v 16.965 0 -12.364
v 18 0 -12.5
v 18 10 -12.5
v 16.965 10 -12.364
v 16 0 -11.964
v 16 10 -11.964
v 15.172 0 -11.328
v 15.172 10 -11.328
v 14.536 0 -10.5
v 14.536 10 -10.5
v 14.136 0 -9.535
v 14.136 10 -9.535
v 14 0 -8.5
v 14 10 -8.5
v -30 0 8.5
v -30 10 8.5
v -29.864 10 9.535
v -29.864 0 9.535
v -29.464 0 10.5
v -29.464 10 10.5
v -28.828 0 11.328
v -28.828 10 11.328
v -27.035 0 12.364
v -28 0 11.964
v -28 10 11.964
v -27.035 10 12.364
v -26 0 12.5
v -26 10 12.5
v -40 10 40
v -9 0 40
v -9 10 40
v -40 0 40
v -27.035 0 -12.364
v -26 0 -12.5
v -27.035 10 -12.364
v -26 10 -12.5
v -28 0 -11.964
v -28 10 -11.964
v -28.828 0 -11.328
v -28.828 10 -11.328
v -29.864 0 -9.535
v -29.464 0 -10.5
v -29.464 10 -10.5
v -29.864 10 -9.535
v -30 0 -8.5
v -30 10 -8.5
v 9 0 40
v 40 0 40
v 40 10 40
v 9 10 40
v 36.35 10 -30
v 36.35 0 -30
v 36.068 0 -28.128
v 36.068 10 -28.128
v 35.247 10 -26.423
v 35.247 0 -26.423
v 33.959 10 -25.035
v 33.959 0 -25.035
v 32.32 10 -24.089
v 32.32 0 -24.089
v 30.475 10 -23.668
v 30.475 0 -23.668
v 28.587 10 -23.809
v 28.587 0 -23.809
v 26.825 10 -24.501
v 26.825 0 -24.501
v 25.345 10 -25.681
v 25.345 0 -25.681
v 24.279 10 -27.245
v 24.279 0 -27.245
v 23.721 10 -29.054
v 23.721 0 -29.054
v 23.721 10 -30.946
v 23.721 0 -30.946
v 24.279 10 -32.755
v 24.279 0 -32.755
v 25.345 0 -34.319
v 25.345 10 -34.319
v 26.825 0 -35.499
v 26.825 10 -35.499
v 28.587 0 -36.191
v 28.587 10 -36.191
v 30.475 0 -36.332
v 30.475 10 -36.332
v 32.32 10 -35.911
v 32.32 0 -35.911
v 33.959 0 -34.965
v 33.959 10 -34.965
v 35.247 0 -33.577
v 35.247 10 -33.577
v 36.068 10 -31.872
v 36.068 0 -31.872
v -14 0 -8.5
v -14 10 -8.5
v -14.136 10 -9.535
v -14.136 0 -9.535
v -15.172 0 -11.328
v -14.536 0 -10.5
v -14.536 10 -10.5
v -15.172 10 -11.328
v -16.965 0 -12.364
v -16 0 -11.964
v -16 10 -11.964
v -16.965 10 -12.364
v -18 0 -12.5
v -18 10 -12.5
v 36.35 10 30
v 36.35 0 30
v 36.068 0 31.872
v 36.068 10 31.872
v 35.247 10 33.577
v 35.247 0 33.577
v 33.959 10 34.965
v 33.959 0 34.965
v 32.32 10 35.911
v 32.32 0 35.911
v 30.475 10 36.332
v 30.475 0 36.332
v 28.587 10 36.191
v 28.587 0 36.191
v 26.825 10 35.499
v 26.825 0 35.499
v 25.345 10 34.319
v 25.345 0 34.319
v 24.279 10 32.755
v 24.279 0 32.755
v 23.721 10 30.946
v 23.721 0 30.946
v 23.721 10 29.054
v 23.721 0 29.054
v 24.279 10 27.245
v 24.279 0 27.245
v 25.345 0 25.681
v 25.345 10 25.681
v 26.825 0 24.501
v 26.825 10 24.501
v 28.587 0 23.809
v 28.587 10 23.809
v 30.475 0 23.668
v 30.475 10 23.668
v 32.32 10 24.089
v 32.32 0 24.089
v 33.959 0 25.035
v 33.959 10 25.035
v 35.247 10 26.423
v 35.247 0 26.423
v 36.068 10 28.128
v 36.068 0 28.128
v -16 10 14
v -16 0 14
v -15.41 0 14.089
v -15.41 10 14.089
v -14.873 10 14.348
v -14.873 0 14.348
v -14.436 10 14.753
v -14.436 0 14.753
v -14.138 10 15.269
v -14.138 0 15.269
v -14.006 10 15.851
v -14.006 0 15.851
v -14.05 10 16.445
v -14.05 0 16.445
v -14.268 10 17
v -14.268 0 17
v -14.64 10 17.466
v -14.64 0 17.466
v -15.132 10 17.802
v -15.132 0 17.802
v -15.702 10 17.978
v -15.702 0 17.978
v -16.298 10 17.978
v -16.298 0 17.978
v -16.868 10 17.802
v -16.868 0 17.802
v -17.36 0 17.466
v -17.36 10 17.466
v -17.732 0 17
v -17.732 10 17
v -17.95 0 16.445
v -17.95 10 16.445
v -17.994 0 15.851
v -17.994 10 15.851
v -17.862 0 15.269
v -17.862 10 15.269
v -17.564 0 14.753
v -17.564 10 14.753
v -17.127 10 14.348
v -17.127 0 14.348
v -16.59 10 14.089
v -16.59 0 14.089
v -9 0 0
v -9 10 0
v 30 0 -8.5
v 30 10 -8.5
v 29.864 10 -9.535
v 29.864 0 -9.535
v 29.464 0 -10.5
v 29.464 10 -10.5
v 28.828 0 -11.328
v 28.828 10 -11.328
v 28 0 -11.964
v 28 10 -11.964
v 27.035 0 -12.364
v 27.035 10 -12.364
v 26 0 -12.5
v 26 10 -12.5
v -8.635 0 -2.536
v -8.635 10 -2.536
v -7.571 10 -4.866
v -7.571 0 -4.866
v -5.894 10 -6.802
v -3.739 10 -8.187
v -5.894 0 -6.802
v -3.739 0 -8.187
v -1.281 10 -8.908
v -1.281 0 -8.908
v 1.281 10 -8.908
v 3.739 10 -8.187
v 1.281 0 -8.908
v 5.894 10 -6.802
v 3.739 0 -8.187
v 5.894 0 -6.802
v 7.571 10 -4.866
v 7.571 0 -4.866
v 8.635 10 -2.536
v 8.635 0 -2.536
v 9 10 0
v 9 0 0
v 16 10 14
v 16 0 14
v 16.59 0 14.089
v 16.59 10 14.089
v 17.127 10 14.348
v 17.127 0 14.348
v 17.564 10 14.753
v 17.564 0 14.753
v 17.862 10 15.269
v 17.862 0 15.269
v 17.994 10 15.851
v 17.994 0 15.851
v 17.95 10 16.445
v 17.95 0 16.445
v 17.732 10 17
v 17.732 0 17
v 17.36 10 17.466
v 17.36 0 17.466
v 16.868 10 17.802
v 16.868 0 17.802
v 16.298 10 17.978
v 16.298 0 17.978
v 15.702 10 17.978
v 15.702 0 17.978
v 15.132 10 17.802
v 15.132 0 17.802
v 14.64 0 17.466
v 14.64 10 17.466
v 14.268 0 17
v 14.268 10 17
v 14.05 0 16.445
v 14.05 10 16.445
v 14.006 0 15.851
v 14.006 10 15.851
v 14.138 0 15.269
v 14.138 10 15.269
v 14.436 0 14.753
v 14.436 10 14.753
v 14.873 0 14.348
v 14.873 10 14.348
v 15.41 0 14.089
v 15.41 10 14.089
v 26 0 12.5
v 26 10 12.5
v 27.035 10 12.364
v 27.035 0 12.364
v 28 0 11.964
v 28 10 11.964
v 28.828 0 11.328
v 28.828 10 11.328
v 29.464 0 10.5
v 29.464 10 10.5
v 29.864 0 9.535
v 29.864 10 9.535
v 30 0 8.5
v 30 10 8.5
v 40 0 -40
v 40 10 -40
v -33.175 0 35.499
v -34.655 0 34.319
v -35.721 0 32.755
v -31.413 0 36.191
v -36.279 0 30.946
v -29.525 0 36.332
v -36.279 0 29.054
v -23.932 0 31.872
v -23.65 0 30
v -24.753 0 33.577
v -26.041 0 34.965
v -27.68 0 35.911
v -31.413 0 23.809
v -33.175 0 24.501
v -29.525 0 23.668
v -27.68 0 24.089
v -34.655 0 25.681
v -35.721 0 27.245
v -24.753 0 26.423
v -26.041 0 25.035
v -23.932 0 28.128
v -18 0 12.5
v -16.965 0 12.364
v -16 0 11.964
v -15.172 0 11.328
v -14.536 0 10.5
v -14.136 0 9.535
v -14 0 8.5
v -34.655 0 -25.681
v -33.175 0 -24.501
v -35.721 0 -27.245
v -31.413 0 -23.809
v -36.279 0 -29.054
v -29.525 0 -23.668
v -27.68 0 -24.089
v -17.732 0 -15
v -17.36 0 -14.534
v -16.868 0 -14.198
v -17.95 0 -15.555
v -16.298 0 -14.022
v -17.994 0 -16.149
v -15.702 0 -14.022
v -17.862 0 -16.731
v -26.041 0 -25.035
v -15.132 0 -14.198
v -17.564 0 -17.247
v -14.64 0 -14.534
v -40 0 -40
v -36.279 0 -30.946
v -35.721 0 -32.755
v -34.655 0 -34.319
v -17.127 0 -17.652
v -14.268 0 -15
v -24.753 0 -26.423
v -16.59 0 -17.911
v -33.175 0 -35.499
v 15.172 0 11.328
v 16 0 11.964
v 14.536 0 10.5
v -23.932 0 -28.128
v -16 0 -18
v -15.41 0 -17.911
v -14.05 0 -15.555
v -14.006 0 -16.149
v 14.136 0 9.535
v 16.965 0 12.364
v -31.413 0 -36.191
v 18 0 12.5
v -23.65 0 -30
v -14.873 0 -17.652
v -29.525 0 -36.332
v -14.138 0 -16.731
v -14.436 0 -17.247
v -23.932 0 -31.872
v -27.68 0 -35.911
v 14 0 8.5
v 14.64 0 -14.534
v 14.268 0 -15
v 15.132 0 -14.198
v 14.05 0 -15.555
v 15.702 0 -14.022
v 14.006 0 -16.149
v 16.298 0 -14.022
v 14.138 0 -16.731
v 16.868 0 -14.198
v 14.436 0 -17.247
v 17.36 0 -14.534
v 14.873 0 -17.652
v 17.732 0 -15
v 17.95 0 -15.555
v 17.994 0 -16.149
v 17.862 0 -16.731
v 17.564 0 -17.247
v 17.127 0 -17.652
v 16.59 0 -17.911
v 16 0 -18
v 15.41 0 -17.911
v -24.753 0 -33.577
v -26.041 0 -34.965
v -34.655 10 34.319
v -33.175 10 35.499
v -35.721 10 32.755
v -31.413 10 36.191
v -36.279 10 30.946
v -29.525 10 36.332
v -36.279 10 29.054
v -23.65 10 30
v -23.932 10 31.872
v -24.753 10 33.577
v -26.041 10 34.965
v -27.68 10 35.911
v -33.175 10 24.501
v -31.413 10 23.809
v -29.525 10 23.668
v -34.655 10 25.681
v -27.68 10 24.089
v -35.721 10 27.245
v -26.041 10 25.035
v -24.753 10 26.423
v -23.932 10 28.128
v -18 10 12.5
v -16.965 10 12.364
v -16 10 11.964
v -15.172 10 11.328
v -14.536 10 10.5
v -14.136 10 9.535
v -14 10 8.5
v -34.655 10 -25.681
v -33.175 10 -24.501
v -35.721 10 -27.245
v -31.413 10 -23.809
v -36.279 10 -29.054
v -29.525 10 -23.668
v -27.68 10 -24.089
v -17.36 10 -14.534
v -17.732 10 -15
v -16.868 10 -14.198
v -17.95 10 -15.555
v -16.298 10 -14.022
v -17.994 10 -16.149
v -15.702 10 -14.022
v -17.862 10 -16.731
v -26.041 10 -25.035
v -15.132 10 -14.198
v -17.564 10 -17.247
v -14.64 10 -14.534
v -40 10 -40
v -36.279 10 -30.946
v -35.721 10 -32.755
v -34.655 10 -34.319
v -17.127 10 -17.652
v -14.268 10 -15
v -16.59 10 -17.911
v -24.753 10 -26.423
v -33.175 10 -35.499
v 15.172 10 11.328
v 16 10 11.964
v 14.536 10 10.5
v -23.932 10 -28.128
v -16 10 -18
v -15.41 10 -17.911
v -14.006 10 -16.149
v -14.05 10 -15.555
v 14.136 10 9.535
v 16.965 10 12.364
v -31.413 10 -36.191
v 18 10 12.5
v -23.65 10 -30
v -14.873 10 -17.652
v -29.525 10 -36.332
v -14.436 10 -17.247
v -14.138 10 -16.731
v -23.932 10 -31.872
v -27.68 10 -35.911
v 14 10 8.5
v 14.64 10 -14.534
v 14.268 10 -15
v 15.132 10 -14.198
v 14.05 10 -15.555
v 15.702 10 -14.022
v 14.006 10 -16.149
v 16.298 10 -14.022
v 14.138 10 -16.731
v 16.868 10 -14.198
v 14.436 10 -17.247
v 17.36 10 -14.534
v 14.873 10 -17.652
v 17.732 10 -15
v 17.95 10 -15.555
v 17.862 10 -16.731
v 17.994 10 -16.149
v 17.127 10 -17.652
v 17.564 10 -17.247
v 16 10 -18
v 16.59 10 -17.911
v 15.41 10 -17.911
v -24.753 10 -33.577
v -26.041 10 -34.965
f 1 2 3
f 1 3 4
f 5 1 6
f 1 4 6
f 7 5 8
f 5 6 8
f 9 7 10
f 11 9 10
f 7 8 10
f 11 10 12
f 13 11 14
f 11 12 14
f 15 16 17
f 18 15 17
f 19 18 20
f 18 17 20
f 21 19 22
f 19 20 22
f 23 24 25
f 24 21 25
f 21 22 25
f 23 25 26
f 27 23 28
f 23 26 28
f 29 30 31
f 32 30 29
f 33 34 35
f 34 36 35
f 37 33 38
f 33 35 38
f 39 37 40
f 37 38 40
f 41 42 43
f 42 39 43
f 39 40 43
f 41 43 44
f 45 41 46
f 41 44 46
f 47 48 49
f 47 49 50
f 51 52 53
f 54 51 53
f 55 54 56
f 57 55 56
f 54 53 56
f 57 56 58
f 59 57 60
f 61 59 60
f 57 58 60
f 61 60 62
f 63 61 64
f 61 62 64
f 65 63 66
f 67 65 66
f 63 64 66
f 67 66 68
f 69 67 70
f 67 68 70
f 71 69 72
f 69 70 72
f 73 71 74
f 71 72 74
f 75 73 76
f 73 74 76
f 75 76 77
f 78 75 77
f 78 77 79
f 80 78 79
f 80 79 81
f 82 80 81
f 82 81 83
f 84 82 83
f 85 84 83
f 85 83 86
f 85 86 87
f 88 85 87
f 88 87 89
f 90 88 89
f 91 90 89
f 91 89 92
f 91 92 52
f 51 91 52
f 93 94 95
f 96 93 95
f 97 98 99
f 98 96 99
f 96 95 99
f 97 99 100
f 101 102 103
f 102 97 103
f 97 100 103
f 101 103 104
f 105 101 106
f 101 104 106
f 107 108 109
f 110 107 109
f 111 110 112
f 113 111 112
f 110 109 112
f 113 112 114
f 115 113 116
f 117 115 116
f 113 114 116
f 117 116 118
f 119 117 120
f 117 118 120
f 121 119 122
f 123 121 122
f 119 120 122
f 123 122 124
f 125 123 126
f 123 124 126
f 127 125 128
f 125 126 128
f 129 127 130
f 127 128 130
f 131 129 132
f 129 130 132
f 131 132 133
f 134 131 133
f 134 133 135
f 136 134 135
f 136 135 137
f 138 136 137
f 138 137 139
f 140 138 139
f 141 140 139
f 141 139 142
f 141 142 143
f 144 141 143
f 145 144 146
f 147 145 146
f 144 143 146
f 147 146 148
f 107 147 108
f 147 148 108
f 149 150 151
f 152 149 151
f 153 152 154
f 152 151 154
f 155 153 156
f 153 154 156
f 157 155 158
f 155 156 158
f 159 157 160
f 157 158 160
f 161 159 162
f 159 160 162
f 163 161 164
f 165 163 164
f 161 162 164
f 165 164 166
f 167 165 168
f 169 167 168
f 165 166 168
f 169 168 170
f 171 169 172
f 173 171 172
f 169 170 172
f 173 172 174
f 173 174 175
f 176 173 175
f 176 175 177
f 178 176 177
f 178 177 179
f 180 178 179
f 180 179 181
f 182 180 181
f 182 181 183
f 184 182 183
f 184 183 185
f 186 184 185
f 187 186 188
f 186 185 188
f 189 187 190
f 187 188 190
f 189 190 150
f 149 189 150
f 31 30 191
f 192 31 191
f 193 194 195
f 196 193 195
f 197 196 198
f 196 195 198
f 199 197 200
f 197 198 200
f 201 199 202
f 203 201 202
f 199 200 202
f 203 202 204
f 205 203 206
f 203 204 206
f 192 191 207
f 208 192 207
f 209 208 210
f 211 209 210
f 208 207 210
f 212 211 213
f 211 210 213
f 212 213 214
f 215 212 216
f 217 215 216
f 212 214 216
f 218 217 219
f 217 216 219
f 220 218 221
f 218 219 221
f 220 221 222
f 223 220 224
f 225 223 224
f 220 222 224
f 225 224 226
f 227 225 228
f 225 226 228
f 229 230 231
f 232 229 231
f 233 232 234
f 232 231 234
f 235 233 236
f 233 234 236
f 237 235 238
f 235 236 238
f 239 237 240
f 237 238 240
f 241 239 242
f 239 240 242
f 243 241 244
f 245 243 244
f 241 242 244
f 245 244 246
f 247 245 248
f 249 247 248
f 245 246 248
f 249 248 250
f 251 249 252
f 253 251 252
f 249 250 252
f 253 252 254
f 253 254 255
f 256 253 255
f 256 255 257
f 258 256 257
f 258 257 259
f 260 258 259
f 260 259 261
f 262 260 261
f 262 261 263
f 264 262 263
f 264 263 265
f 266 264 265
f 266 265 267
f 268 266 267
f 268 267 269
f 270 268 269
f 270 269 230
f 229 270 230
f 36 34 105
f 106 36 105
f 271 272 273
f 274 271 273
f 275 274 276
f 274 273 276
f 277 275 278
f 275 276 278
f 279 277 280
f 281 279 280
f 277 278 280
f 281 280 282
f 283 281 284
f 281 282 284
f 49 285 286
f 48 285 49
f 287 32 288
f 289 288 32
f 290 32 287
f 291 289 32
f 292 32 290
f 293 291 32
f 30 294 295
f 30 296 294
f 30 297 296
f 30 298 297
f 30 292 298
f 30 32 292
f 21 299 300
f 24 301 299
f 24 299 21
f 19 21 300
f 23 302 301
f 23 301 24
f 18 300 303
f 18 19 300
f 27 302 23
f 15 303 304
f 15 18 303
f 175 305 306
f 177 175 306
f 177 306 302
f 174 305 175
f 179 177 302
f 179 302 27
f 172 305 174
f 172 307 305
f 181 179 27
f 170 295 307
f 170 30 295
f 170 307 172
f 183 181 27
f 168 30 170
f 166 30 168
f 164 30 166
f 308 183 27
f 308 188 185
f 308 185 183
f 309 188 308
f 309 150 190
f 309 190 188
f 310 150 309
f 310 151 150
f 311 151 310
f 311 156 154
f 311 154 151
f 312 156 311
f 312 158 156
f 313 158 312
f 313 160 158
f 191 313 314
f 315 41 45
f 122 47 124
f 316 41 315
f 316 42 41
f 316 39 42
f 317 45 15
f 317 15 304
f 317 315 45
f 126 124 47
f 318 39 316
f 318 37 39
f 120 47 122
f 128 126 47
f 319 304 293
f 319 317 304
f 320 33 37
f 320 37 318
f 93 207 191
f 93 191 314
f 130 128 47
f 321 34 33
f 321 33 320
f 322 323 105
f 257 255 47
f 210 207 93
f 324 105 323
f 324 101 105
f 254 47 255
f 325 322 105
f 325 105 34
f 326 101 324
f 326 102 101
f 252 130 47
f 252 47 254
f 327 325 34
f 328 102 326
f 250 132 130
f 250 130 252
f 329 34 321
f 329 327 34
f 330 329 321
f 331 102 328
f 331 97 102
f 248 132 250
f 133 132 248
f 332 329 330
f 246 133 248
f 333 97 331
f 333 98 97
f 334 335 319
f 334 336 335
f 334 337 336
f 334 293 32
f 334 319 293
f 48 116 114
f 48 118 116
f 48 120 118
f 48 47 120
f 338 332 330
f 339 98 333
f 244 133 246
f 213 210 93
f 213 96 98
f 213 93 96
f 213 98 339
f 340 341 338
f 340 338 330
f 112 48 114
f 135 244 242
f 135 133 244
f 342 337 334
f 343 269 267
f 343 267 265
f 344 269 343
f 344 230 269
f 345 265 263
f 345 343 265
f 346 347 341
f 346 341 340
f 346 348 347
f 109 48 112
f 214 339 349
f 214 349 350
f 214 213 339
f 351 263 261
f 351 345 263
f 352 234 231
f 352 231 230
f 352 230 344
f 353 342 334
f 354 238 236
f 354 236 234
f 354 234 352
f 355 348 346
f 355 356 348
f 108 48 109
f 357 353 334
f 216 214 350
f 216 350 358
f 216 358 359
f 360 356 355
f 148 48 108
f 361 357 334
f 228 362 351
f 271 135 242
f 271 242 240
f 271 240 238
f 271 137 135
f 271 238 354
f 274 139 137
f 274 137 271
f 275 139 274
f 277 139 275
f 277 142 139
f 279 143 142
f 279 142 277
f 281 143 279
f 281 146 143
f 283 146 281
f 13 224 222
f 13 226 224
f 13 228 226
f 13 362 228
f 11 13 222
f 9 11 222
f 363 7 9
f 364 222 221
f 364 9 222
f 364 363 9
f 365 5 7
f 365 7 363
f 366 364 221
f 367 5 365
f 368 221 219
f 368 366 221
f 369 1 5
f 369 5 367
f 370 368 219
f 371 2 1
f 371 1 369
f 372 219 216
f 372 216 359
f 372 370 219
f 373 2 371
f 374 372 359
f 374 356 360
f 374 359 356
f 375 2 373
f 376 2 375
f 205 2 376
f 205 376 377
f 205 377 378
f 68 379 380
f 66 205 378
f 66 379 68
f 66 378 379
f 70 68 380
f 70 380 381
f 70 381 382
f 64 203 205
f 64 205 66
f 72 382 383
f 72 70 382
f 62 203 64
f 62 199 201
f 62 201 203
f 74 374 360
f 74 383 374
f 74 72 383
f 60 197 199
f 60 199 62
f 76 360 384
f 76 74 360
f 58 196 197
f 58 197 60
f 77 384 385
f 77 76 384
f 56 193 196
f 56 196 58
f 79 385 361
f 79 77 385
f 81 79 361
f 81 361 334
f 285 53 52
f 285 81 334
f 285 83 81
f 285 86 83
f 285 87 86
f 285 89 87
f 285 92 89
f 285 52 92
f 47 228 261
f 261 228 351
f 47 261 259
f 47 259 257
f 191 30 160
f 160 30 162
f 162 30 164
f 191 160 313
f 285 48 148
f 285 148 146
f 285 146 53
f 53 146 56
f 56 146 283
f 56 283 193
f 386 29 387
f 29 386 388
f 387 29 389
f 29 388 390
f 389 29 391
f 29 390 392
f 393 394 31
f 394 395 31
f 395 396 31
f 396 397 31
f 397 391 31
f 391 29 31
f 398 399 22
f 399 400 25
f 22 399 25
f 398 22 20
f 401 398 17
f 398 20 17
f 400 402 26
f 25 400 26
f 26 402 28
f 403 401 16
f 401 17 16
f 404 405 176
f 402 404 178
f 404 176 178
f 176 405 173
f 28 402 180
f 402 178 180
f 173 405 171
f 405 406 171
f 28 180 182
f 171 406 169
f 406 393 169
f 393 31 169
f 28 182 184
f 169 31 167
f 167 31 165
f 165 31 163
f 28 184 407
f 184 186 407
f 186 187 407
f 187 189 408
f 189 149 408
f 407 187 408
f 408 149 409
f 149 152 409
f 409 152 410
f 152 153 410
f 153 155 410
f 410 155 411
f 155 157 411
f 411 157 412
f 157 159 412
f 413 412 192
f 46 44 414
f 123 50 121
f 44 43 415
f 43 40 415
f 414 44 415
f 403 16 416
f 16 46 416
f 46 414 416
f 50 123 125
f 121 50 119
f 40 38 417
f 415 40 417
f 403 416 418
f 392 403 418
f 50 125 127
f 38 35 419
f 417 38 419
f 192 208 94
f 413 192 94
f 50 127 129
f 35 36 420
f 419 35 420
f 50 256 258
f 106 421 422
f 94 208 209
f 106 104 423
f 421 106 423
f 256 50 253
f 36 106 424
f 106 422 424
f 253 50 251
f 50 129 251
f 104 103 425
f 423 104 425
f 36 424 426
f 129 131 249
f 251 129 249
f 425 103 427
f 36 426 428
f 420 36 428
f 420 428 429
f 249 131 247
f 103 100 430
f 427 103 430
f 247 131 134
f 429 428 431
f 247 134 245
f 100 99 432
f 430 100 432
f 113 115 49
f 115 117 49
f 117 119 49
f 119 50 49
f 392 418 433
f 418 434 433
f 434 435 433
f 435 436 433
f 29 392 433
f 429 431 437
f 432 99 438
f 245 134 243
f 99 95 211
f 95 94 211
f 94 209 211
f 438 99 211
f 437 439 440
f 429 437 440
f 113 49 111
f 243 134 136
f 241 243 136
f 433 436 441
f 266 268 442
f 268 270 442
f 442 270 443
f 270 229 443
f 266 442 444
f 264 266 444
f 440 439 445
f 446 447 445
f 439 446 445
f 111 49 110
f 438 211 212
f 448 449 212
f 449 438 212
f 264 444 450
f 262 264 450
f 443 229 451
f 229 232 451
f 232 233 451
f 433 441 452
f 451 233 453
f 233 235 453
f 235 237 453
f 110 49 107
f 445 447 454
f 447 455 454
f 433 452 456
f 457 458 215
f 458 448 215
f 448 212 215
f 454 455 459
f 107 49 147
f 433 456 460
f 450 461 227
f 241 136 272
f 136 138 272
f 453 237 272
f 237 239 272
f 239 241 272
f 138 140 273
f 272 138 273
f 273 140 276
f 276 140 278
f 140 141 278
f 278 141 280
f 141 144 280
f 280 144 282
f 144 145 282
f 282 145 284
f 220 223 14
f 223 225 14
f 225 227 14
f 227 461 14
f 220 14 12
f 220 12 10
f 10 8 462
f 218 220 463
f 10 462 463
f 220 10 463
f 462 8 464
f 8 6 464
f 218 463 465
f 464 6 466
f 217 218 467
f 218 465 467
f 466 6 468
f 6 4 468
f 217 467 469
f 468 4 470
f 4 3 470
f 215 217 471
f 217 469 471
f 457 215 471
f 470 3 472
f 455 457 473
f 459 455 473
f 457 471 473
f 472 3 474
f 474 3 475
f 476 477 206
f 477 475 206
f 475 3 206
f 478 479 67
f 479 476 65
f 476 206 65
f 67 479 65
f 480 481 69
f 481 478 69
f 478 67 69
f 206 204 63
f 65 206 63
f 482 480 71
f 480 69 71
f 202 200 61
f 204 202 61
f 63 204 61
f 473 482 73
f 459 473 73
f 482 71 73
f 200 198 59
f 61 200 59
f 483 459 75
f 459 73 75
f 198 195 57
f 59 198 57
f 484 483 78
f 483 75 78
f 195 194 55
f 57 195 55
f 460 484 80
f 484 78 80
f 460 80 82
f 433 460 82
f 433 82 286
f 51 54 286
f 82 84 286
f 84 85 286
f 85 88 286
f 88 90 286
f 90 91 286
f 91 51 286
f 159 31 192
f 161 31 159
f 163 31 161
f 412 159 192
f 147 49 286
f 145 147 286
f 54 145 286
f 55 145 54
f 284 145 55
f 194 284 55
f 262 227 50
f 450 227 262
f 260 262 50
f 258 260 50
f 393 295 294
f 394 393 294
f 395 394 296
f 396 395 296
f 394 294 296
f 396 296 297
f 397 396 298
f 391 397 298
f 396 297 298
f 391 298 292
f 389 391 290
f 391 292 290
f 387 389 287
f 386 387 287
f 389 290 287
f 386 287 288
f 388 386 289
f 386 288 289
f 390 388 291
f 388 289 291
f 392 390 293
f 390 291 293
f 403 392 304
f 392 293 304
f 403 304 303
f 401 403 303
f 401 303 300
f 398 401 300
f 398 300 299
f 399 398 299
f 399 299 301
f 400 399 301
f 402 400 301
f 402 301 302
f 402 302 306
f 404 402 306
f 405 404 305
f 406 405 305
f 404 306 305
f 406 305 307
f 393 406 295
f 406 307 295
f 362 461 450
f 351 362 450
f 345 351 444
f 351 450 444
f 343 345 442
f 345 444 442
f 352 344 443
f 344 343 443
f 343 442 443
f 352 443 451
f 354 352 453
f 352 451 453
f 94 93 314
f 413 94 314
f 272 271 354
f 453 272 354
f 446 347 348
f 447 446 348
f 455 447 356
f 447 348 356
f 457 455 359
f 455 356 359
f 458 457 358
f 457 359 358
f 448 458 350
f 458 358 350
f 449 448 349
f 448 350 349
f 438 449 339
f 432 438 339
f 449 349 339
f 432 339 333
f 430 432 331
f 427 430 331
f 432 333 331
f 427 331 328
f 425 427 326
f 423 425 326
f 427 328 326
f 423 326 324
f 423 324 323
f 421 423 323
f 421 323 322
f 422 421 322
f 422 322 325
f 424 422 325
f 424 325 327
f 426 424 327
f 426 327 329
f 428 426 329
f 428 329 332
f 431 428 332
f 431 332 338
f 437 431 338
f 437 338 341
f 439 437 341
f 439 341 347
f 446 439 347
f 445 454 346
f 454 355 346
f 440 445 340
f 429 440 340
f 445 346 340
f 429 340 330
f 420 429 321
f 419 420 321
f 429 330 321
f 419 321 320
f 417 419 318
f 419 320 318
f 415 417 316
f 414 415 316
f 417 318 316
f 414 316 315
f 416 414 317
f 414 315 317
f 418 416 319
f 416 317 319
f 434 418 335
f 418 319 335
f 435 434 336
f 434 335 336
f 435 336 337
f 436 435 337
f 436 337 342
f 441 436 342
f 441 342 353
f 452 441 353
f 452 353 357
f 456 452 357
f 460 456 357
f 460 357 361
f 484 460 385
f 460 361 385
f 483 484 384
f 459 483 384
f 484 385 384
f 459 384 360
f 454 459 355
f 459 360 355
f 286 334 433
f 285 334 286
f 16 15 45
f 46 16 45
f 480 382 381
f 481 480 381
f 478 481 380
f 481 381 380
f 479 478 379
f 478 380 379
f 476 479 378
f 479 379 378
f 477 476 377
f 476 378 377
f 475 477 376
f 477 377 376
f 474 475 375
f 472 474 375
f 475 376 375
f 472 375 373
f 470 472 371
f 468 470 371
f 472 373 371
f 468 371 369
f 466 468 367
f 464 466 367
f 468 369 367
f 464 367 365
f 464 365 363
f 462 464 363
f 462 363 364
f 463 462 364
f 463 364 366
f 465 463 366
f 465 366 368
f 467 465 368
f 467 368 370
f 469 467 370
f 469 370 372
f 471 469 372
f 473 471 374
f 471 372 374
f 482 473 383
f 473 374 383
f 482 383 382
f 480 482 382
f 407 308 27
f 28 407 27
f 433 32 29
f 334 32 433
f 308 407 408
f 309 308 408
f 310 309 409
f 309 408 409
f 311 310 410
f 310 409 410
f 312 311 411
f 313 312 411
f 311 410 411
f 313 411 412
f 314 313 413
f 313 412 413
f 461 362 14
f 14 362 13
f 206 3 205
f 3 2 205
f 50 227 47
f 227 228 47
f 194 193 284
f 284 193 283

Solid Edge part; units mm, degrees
sketch "Sketch1" plane through (0, 0, 0) normal (0, -1, 0) x (1, 0, 0)
  line L0 (40, 40) -> (-40, 40)
  line L1 (-40, 40) -> (-40, -40)
  line L2 (-40, -40) -> (40, -40)
  line L3 (40, -40) -> (40, 40)
  circle A0 centre (0, 0) radius 9
extrude "Extrusionsausprägung_23" add sketch "Sketch1" against normal blind 10
sketch "Sketch2" plane through (0, 0, 0) normal (0, -1, 0) x (1, 0, 0)
  circle A0 centre (-30, 30) radius 6.35
  circle A1 centre (30, 30) radius 6.35
  circle A2 centre (30, -30) radius 6.35
  circle A3 centre (-30, -30) radius 6.35
extrude "Extrusionsausschnitt_26" cut sketch "Sketch2" against normal blind 274
hole "Bohrung_9" at (16, 0, 16) direction (0, 1, 0) diameter 4 end up to next
hole "Hole1" at (16, 0, -16) direction (0, 1, 0) diameter 4 end up to next
hole "Hole2" at (-16, 0, -16) direction (0, 1, 0) diameter 4 end up to next
hole "Hole3" at (-16, 0, 16) direction (0, 1, 0) diameter 4 end up to next
sketch "Sketch3" plane through (0, 0, 0) normal (0, -1, 0) x (1, 0, 0)
  line L0 (9, 50) -> (-9, 50)
  line L1 (-9, 50) -> (-9, 0)
  line L2 (-9, 0) -> (9, 0)
  line L3 (9, 0) -> (9, 50)
extrude "Extrusionsausschnitt_27" cut sketch "Sketch3" against normal blind 138
sketch "Sketch4" plane through (0, 0, 0) normal (0, -1, 0) x (1, 0, 0)
  line L0 (-14, 12.5) -> (-30, 12.5)
  line L1 (-30, 12.5) -> (-30, -12.5)
  line L2 (-30, -12.5) -> (-14, -12.5)
  line L3 (-14, -12.5) -> (-14, 12.5)
extrude "Extrusionsausschnitt_28" cut sketch "Sketch4" against normal blind 67
fillet "Verrundung_16" radius 4 4 edges at (-30, 5, 12.5) (-14, 5, 12.5) (-30, 5, -12.5) (-14, 5, -12.5)
mirror "Mirror1" about plane through (0, 0, 0) normal (1, 0, 0) of "Extrusionsausschnitt_28", "Verrundung_16"
